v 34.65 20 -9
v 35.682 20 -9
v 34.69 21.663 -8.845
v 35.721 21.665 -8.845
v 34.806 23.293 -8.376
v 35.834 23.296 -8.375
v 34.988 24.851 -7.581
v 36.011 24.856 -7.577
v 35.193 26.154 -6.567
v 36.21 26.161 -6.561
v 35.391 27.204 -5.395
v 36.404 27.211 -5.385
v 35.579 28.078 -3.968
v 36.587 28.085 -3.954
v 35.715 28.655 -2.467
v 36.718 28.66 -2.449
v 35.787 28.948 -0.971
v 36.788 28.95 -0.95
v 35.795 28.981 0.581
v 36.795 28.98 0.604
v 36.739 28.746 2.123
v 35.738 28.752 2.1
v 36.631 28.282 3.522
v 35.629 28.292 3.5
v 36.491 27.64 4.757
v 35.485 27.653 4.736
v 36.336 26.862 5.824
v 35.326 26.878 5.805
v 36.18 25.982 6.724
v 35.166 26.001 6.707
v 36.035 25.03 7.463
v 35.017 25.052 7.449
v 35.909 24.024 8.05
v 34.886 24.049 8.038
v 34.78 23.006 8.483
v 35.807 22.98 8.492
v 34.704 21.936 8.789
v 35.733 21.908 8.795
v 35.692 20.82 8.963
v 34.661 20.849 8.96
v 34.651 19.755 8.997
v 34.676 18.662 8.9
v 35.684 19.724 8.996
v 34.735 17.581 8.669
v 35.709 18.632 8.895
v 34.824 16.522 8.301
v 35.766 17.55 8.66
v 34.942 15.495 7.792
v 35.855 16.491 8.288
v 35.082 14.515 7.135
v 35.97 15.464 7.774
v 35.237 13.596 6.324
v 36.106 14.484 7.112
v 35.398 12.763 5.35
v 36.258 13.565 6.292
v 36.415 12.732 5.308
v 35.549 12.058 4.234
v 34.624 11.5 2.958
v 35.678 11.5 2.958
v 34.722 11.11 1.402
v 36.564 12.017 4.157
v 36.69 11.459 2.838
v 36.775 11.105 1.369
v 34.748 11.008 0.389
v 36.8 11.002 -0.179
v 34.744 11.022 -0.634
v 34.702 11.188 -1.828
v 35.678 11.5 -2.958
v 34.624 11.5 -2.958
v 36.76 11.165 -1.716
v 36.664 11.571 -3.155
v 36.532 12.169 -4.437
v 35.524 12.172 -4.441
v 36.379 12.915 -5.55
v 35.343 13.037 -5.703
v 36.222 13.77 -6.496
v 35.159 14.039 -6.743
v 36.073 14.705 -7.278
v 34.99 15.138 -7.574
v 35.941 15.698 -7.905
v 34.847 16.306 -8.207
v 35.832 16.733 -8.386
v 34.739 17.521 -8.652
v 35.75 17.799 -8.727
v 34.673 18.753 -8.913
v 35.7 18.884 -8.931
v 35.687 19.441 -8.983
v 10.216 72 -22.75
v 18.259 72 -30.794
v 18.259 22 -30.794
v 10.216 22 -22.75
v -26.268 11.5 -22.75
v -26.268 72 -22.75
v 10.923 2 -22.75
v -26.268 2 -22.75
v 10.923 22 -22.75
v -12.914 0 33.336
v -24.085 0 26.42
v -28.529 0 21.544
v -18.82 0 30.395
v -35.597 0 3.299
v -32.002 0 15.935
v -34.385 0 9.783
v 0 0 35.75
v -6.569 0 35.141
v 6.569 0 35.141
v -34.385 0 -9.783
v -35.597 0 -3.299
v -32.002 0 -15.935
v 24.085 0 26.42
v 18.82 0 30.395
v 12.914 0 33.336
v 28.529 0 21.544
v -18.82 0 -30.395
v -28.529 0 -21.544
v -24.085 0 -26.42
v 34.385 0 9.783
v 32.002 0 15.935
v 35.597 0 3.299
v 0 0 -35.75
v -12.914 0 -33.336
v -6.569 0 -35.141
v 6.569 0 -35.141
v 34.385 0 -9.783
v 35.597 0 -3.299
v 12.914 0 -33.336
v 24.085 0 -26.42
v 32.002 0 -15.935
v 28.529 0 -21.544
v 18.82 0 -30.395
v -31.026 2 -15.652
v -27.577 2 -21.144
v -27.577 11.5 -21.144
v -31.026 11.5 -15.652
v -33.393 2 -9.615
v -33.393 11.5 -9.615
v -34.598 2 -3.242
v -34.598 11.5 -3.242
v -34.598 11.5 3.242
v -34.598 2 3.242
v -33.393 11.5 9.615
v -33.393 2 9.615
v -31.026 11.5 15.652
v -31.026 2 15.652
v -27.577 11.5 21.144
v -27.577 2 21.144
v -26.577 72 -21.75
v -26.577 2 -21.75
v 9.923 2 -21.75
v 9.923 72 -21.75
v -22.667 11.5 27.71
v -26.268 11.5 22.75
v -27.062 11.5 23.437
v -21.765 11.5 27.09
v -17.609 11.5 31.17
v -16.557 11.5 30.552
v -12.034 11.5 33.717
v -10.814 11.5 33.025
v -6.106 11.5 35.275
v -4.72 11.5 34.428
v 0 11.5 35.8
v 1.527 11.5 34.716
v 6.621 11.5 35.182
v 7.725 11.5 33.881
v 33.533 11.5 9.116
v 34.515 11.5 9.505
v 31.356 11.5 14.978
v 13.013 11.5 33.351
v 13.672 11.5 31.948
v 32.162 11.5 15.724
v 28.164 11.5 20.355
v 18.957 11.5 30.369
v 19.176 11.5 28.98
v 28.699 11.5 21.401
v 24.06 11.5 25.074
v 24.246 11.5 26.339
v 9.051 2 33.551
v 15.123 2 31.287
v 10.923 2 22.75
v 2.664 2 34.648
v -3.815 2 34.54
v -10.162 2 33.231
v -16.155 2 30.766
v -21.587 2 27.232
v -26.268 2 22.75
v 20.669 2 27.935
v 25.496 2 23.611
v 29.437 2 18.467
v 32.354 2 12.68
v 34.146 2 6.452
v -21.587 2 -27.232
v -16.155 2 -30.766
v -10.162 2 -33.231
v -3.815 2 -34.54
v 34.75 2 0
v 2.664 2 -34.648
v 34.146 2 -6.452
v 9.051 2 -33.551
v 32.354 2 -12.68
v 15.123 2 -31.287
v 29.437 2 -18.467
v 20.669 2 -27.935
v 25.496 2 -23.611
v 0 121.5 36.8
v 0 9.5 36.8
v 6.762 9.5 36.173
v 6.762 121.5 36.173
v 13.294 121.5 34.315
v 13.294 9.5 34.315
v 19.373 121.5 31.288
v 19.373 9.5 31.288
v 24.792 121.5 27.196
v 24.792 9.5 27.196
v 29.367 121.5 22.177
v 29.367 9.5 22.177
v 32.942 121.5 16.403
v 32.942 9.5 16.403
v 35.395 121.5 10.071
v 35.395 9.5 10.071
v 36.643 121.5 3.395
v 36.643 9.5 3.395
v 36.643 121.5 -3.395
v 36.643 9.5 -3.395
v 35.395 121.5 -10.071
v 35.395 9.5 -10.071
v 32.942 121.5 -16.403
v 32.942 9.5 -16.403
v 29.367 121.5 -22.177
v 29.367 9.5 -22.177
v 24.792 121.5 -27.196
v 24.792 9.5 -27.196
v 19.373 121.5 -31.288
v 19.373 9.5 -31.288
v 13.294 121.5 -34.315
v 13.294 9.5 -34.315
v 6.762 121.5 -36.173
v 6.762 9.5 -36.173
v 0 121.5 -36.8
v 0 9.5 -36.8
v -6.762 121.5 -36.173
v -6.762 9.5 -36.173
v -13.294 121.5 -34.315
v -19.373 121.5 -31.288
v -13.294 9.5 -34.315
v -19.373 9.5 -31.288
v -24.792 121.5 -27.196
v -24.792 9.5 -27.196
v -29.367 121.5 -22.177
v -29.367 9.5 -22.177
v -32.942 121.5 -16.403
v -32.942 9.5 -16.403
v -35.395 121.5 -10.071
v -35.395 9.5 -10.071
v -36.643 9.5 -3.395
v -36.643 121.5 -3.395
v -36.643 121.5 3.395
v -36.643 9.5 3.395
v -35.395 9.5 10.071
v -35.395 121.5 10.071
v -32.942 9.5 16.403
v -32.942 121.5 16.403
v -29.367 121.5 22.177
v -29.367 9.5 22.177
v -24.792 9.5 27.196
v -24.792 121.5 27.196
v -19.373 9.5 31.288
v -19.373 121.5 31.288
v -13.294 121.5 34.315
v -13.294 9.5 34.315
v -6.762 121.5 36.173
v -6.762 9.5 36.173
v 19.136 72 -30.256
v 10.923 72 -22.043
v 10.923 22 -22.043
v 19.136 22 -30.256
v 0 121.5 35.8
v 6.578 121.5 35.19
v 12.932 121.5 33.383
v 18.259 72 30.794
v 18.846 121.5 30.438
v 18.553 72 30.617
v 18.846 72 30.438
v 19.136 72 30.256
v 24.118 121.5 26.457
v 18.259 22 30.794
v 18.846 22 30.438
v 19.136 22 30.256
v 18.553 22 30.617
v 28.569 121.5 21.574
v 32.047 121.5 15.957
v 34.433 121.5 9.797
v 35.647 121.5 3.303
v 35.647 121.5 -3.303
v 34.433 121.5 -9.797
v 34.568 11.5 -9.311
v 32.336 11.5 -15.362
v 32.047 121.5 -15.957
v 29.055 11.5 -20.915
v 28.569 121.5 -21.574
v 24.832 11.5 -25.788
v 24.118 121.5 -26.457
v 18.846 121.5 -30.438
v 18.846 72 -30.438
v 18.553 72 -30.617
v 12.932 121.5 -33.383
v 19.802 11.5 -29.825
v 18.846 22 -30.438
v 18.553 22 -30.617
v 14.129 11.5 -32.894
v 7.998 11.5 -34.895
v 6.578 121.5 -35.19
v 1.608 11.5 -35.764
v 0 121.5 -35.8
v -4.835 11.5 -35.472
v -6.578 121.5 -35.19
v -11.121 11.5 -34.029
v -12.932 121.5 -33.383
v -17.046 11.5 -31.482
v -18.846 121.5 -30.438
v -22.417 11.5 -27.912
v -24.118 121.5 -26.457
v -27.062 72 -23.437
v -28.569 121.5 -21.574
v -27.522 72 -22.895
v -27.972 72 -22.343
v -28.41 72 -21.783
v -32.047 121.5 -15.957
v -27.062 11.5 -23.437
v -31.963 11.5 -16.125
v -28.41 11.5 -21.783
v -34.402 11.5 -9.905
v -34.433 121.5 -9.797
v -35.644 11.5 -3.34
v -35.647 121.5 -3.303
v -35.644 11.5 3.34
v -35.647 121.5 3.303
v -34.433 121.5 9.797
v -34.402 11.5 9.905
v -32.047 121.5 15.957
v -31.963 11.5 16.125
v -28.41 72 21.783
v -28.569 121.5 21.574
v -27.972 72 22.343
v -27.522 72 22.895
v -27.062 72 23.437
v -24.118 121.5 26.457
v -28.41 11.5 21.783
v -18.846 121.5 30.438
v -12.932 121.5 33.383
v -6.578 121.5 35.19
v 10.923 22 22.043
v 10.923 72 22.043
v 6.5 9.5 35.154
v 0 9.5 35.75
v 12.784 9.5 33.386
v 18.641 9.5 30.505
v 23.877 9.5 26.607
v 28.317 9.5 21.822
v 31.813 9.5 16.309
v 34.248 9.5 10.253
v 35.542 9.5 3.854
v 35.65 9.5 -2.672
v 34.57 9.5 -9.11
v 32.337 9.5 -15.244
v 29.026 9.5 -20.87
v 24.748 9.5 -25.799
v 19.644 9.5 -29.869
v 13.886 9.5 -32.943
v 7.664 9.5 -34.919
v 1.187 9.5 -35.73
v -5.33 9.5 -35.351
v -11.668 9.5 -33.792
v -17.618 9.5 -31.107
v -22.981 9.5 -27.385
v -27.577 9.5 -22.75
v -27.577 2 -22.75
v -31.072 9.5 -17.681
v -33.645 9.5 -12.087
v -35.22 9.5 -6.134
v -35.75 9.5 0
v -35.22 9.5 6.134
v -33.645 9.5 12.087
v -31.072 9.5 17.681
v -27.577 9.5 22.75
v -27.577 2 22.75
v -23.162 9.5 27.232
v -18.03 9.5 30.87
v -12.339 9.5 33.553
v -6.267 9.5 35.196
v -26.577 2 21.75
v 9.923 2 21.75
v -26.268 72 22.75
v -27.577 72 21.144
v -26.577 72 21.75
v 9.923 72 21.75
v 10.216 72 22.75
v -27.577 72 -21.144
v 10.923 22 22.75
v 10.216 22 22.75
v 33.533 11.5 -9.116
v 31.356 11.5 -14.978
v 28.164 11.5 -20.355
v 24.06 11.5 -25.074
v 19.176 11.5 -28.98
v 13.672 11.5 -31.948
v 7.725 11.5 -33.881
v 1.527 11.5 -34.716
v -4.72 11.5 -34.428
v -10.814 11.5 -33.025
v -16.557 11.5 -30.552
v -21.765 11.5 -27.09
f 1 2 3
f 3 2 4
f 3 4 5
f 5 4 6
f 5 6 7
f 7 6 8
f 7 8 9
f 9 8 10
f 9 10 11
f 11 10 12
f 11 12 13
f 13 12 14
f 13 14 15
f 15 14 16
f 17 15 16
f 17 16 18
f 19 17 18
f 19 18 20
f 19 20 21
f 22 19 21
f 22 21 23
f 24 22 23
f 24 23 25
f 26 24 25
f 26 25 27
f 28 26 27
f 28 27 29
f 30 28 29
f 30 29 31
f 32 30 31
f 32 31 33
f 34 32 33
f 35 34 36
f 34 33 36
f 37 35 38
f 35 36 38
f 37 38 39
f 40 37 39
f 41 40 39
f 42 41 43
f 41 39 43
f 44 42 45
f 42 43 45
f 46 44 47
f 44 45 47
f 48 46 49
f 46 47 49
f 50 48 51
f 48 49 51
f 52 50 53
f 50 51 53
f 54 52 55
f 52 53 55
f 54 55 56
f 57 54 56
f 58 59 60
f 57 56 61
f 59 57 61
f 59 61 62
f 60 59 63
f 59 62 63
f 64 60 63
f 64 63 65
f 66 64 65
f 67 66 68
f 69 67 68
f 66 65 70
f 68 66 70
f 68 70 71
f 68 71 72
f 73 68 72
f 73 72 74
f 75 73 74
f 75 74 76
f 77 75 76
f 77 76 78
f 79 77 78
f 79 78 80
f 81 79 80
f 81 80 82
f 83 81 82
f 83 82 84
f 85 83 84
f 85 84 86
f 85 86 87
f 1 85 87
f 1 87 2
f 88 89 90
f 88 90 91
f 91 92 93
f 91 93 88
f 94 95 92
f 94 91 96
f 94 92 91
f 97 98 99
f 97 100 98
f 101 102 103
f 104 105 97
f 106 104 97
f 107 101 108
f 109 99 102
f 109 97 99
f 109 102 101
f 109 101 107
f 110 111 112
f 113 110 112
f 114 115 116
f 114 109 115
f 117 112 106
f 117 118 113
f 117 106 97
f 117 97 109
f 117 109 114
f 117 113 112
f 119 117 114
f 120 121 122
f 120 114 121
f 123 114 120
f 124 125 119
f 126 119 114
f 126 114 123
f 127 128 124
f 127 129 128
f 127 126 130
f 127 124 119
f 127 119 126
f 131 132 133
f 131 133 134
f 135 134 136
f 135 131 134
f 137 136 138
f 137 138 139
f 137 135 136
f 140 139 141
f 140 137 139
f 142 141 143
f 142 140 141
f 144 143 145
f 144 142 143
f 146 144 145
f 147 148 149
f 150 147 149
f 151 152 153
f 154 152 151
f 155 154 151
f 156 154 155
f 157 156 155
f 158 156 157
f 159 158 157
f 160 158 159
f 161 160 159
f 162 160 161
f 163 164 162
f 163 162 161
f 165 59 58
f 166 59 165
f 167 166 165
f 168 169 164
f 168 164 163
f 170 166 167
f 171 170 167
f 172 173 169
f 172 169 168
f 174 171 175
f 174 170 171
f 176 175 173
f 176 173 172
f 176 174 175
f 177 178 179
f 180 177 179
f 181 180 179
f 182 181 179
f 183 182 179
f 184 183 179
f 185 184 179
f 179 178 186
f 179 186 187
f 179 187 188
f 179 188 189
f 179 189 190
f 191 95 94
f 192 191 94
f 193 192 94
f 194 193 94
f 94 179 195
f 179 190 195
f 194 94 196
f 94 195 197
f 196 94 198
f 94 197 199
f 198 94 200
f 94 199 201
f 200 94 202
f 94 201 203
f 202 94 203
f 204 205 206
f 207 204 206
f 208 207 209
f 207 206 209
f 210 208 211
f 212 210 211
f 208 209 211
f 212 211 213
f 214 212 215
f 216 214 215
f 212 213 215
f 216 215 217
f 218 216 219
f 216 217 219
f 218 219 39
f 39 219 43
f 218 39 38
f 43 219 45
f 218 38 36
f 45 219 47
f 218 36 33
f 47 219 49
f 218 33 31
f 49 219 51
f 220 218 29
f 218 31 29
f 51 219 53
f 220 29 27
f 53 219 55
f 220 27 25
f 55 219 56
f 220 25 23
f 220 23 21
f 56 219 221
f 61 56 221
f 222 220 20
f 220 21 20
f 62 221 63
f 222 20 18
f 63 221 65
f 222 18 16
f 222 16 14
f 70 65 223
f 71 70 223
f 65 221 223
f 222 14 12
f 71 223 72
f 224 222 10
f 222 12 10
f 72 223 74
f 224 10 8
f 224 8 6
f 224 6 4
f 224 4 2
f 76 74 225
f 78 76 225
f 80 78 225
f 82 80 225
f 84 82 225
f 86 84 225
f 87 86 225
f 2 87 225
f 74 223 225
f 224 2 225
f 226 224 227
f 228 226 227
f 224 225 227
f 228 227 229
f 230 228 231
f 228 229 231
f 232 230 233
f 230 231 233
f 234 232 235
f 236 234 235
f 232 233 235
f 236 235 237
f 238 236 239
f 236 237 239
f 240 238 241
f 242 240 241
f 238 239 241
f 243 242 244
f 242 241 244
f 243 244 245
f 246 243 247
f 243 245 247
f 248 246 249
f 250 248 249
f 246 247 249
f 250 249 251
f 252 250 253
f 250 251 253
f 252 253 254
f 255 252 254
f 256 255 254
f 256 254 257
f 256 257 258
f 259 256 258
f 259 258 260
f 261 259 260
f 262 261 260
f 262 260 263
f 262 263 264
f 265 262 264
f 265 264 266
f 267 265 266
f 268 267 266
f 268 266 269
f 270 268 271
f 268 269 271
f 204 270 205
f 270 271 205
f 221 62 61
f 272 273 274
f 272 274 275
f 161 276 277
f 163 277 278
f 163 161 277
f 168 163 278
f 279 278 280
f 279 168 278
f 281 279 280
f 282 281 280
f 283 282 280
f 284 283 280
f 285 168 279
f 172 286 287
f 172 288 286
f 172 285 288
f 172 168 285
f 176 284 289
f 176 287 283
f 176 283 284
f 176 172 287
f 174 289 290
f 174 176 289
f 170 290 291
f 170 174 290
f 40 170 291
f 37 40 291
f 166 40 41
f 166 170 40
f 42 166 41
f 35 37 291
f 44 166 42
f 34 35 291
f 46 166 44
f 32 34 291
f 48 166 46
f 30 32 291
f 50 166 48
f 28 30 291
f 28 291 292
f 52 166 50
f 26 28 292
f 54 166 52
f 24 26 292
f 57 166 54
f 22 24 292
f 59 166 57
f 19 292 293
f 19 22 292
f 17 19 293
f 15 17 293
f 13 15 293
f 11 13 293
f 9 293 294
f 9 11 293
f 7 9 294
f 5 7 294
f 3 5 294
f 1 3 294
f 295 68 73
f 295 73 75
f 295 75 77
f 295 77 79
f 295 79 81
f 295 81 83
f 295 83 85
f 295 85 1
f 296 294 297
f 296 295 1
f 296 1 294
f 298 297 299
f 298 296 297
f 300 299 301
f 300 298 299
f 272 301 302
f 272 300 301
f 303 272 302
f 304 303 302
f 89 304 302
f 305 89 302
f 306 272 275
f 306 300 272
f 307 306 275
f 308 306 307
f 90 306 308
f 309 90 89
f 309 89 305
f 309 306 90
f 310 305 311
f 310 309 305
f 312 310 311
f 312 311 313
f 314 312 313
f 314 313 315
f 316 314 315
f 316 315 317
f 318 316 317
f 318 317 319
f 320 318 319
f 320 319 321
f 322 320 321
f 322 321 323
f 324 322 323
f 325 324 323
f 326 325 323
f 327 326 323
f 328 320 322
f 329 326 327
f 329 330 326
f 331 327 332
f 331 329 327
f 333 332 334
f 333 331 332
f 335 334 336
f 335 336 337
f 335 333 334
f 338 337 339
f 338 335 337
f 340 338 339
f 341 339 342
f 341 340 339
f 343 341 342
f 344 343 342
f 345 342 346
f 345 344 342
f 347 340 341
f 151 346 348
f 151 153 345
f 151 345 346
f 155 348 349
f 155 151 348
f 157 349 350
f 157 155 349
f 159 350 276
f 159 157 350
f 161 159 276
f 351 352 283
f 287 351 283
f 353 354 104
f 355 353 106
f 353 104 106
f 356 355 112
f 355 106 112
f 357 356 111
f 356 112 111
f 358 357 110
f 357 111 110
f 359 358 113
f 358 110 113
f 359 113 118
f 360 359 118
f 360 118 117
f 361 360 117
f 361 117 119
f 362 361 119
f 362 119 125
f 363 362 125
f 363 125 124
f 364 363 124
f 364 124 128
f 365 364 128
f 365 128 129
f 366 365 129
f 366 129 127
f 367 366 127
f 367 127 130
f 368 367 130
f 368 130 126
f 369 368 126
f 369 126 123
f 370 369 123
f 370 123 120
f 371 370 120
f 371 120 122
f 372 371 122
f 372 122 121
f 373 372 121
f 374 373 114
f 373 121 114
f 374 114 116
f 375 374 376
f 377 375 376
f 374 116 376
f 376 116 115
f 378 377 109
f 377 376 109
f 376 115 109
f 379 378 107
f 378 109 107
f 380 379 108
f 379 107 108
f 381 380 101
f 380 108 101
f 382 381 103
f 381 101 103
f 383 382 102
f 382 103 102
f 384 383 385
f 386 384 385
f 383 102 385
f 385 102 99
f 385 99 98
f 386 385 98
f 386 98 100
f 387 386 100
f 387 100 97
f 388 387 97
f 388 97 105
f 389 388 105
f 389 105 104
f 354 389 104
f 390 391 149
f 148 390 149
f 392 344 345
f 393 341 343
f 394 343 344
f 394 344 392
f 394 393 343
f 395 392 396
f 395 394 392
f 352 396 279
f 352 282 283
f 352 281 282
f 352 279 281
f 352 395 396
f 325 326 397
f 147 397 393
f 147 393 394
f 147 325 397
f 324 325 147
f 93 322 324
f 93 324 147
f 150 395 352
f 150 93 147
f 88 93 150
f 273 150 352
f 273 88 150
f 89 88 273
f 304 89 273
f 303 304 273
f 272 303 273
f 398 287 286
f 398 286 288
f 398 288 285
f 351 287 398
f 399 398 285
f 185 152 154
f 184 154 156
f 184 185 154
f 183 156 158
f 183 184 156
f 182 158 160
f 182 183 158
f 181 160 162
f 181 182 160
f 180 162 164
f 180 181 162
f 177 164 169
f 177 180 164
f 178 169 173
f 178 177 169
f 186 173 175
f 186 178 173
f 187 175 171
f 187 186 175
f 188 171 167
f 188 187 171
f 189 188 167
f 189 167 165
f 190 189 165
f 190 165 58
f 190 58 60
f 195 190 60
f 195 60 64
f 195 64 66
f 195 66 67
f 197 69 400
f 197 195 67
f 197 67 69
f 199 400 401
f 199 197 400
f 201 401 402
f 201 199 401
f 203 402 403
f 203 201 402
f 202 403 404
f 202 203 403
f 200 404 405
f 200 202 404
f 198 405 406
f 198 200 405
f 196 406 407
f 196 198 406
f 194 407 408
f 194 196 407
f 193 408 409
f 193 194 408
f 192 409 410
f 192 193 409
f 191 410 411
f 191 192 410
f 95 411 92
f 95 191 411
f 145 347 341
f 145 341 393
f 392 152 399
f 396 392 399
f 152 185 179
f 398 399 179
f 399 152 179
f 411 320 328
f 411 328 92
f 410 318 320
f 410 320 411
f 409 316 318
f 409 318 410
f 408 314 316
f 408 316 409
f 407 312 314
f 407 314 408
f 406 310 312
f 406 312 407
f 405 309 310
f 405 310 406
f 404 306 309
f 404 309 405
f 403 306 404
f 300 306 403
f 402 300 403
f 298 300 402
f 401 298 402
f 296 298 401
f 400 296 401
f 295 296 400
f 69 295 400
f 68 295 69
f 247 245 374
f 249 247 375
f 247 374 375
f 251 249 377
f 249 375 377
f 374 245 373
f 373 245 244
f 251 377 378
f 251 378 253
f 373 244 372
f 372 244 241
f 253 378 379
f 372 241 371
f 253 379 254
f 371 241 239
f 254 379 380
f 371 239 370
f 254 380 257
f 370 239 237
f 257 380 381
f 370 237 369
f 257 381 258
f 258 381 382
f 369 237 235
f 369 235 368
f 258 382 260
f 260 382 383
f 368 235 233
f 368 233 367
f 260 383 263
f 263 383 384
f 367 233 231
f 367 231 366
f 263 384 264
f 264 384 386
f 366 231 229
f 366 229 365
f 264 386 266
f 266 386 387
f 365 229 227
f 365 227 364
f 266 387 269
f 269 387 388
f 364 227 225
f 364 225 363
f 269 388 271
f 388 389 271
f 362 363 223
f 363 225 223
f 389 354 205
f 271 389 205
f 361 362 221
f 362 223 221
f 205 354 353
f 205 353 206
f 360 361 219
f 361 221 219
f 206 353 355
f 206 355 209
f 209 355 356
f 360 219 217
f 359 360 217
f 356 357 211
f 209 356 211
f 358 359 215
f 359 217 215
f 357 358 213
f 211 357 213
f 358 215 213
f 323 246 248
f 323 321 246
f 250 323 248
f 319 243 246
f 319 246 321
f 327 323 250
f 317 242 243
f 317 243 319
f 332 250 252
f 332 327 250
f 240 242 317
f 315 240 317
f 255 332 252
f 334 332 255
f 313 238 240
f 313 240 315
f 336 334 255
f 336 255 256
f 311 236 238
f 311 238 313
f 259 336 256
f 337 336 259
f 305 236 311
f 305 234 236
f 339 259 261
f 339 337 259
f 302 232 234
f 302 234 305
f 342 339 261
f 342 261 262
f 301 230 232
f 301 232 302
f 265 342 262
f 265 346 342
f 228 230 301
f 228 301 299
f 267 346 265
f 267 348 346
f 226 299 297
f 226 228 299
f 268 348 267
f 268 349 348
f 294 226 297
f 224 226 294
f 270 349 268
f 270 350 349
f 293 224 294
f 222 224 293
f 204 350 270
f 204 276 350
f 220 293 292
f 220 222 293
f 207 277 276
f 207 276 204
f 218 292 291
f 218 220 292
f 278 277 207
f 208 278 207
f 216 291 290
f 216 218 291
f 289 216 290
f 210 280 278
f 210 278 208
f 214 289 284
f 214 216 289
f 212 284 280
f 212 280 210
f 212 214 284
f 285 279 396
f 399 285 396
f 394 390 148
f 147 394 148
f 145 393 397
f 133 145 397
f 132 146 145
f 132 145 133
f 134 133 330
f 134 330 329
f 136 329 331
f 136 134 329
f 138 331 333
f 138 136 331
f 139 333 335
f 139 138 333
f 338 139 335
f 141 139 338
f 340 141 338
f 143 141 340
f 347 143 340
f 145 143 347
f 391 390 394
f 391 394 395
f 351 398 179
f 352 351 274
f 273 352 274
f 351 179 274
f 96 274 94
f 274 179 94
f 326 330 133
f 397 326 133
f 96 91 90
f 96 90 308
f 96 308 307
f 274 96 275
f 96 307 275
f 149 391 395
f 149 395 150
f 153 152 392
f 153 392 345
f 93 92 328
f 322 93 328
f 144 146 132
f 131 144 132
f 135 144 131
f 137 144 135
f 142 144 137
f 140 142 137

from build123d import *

# Parameters (mm, degrees)
SKETCH1_R           = 35.75
SKETCH1_R_2         = 34.75
BOSS_EXTRUDE1_DEPTH = 9.5
SKETCH3_R           = 34.75
BOSS_EXTRUDE2_DEPTH = 2
SKETCH4_W           = 38.5
SKETCH4_H           = 45.5
SKETCH4_W_2         = 36.5
SKETCH4_H_2         = 43.5
BOSS_EXTRUDE3_DEPTH = 70
SKETCH2_R           = 36.8
SKETCH2_R_2         = 34.75
BOSS_EXTRUDE4_DEPTH = 2
SKETCH5_R           = 36.8
SKETCH5_R_2         = 35.8
BOSS_EXTRUDE5_DEPTH = 110
BOSS_EXTRUDE6_START = -60.5
BOSS_EXTRUDE6_DEPTH = 60.5
SKETCH7_R           = 9
CUT_EXTRUDE1_DEPTH  = 5
BOSS_EXTRUDE7_DEPTH = 50


with BuildPart() as part:
    # Sketch1 → Boss-Extrude1 (new body)
    with BuildSketch(Plane(origin=(0, 0, 0), x_dir=(1, 0, 0), z_dir=(0, 1, 0))):
        with Locations(Location((0, 0, 0), (0, 0, 270))):
            Circle(SKETCH1_R)
        with Locations(Location((0, 0, 0), (0, 0, 270))):
            Circle(SKETCH1_R_2, mode=Mode.SUBTRACT)
    extrude(amount=BOSS_EXTRUDE1_DEPTH)

    # Sketch3 → Boss-Extrude2 (add)
    with BuildSketch(Plane.XZ):
        with Locations(Location((0, 0, 0), (0, 0, 270))):
            Circle(SKETCH3_R)
    extrude(amount=-BOSS_EXTRUDE2_DEPTH)

    # Sketch4 → Boss-Extrude3 (add)
    with BuildSketch(Plane(origin=(0, 2, 0), x_dir=(1, 0, 0), z_dir=(0, 1, 0))):
        with Locations((-8.327164466, 0)):
            Rectangle(SKETCH4_W, SKETCH4_H)
        with Locations((-8.327164466, 0)):
            Rectangle(SKETCH4_W_2, SKETCH4_H_2, mode=Mode.SUBTRACT)
    extrude(amount=BOSS_EXTRUDE3_DEPTH)

    # Sketch2 → Boss-Extrude4 (add)
    with BuildSketch(Plane(origin=(0, 9.5, 0), x_dir=(1, 0, 0), z_dir=(0, 1, 0))):
        with Locations(Location((0, 0, 0), (0, 0, 270))):
            Circle(SKETCH2_R)
        Circle(SKETCH2_R_2, mode=Mode.SUBTRACT)
    extrude(amount=BOSS_EXTRUDE4_DEPTH)

    # Sketch5 → Boss-Extrude5 (add)
    with BuildSketch(Plane(origin=(0, 11.5, 0), x_dir=(1, 0, 0), z_dir=(0, 1, 0))):
        with Locations(Location((0, 0, 0), (0, 0, 270))):
            Circle(SKETCH5_R)
        with Locations(Location((0, 0, 0), (0, 0, 270))):
            Circle(SKETCH5_R_2, mode=Mode.SUBTRACT)
    extrude(amount=BOSS_EXTRUDE5_DEPTH)

    # Sketch6 → Boss-Extrude6 (add)
    with BuildSketch(Plane(origin=(0, 72, 0), x_dir=(1, 0, 0), z_dir=(0, 1, 0)).offset(BOSS_EXTRUDE6_START)):
        with BuildLine():
            Line((-26.267851073, 22.75), (-27.061555926, 23.437410072))
            ThreePointArc((-27.061555926, 23.437410072), (-27.748330258, 22.620127494), (-28.410431306, 21.782731532))
            Line((-28.410431306, 21.782731532), (-27.577164466, 21.143852534))
            Line((-27.577164466, 21.143852534), (-26.267851073, 22.75))
        make_face()
        with BuildLine():
            Line((-26.267851073, -22.75), (-27.061555926, -23.437410072))
            ThreePointArc((-27.061555926, -23.437410072), (-27.748330258, -22.620127494), (-28.410431306, -21.782731532))
            Line((-28.410431306, -21.782731532), (-27.577164466, -21.143852534))
            Line((-27.577164466, -21.143852534), (-26.267851073, -22.75))
        make_face()
    extrude(amount=BOSS_EXTRUDE6_DEPTH)

    # Sketch7 → Cut-Extrude1 (cut)
    with BuildSketch(Plane(origin=(36.8, 0, 0), x_dir=(0, 0, -1), z_dir=(1, 0, 0))):
        with Locations((0, 20)):
            Circle(SKETCH7_R)
    extrude(amount=-CUT_EXTRUDE1_DEPTH, mode=Mode.SUBTRACT)

    # Sketch8 → Boss-Extrude7 (add)
    with BuildSketch(Plane(origin=(0, 72, 0), x_dir=(1, 0, 0), z_dir=(0, 1, 0))):
        Polygon((10.276388924, 21.396446609), (19.780640943, 30.900698628), (18.782256531, 31.316527778), (9.569282143, 22.103553391), align=None)
        Polygon((9.569282143, -22.103553391), (10.276388924, -21.396446609), (19.780640943, -30.900698628), (18.782256531, -31.316527778), align=None)
    extrude(amount=-BOSS_EXTRUDE7_DEPTH)


solid = part.part
